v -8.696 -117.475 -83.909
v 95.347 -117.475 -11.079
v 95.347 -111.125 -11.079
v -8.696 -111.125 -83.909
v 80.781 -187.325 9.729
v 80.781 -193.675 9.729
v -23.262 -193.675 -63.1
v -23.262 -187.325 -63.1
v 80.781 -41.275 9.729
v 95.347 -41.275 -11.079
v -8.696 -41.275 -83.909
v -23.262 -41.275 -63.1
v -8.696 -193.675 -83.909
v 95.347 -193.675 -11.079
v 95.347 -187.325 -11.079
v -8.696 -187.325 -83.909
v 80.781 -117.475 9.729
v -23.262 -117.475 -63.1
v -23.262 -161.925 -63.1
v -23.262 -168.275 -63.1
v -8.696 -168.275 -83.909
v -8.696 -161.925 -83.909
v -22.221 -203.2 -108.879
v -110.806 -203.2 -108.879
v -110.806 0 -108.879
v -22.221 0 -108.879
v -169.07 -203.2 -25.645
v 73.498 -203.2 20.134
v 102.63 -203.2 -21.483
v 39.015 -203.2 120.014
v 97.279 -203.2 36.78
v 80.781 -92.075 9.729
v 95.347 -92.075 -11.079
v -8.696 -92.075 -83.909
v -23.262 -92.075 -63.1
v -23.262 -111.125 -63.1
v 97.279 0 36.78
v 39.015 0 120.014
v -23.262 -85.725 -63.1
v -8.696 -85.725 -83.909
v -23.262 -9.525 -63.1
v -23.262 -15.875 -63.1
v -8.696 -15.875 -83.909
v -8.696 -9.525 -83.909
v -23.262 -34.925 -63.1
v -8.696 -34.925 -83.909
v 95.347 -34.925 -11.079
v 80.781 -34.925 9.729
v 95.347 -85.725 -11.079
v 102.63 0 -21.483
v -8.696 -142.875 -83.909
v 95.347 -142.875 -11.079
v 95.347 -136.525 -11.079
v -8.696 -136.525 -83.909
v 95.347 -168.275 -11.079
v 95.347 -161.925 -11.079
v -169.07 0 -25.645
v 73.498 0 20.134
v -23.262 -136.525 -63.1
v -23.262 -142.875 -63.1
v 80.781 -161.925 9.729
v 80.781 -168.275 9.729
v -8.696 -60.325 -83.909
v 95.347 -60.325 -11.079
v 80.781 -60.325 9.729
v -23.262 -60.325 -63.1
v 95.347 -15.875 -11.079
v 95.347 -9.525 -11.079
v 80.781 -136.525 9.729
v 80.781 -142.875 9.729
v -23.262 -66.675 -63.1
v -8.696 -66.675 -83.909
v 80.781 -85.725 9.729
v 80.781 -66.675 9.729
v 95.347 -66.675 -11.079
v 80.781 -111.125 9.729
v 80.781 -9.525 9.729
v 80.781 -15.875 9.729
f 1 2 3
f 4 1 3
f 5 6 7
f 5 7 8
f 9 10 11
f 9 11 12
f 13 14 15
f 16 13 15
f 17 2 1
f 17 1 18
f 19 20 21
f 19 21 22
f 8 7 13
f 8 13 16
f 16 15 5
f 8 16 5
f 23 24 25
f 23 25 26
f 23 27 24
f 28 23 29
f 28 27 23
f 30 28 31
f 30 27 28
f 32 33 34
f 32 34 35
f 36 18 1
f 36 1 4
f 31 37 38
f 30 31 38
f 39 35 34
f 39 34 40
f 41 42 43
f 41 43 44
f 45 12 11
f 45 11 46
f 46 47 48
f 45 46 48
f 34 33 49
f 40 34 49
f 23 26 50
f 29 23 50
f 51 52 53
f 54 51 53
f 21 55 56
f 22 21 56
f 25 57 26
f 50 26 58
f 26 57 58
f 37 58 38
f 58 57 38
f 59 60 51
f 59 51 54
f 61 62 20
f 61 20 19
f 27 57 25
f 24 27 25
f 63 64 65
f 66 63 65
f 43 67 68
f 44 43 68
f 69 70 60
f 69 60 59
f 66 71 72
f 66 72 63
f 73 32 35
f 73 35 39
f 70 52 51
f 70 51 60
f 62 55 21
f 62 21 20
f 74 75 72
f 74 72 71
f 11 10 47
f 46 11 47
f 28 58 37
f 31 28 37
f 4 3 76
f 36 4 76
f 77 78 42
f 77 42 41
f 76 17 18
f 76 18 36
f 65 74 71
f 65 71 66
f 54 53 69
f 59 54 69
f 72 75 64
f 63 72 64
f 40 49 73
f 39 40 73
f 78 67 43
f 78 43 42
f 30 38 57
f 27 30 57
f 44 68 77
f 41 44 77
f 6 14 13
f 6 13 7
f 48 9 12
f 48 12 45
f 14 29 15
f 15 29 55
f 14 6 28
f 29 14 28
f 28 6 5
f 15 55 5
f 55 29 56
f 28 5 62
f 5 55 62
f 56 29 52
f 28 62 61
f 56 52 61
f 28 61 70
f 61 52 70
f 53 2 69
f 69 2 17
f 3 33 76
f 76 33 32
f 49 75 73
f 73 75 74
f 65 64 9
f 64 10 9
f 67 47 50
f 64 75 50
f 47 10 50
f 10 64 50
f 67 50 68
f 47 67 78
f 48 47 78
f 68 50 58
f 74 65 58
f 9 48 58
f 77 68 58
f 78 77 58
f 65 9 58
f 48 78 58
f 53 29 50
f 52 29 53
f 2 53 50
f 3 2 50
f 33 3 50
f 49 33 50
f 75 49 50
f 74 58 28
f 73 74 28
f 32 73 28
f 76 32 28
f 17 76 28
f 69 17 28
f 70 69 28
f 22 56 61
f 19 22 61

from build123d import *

# Parameters (mm, degrees)
F1_DEPTH = 203.2
F2_W     = 6.35
F2_H     = 25.4
F3_DEPTH = 127


with BuildPart() as f1:
    # F0 (on Front) → F1 (new body)
    with BuildSketch(Plane.XZ):
        Polygon((39.0150669992, 120.0144297529), (-169.0698442861, -25.6450007532), (-110.8060720837, -108.8789652674), (73.4977095011, 20.1336752934), (97.2788392016, 36.7804652388), align=None)
        Polygon((73.4977095011, 20.1336752934), (-110.8060720837, -108.8789652674), (-22.2213511689, -108.8789652674), (102.6295956023, -21.4833069637), align=None)
    extrude(amount=F1_DEPTH)

    # F2 (on face) → F3 (cut)
    with BuildSketch(Plane(origin=(58.786096923, 0, 41.1502657574), x_dir=(0, 1, 0), z_dir=(0.8192319342, 0, 0.5734623248))):
        with Locations((-190.5, -51.0540176069)):
            Rectangle(F2_W, F2_H)
        with Locations((-165.1, -51.0540176069)):
            Rectangle(F2_W, F2_H)
        with Locations((-139.7, -51.0540176069)):
            Rectangle(F2_W, F2_H)
        with Locations((-114.3, -51.0540176069)):
            Rectangle(F2_W, F2_H)
        with Locations((-88.9, -51.0540176069)):
            Rectangle(F2_W, F2_H)
        with Locations((-63.5, -51.0540176069)):
            Rectangle(F2_W, F2_H)
        with Locations((-38.1, -51.0540176069)):
            Rectangle(F2_W, F2_H)
        with Locations((-12.7, -51.0540176069)):
            Rectangle(F2_W, F2_H)
    extrude(amount=-F3_DEPTH, mode=Mode.SUBTRACT)


solid = f1.part
